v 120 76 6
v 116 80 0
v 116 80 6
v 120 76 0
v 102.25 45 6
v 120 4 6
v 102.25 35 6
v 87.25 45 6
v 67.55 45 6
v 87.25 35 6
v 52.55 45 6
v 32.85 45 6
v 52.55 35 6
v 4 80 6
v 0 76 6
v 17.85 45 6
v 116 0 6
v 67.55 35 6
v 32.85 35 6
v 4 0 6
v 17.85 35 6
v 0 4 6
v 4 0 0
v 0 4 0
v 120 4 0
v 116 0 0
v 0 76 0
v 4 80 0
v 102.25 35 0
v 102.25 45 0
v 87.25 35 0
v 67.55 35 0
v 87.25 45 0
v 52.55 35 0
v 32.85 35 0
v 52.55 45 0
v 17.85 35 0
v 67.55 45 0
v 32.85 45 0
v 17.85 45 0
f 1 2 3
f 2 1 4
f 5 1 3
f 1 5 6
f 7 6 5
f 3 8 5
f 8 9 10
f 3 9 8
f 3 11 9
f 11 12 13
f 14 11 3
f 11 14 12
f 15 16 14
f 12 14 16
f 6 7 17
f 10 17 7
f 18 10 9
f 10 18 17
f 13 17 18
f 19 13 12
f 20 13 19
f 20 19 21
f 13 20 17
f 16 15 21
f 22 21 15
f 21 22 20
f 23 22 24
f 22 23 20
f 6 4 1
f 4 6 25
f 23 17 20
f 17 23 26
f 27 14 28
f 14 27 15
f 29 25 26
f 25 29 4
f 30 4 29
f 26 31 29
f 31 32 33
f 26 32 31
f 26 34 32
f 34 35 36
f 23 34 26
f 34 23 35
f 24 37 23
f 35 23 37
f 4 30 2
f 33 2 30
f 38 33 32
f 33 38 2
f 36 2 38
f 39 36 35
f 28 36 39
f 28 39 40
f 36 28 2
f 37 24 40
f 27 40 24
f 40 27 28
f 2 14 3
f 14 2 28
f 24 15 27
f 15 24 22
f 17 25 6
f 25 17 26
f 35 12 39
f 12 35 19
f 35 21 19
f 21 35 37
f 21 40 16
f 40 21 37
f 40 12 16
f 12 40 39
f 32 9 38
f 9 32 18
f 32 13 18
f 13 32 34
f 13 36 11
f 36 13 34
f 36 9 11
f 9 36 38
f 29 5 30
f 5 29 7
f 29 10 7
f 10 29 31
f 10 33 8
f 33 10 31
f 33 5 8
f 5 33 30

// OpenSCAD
$fn = 32;

// ----------------------------------------------------------------------
// Windowed plate: 3 voids, 120 x 80 x 6 mm
// ----------------------------------------------------------------------

// --- parameters (mm) ---
plate_l = 120;            // plate length, X
plate_w = 80;             // plate width, Y
plate_t = 6;              // plate thickness, Z
edge_margin = 8;          // wall from the plate edge to any window
windows = 3;              // number of windows in the row
win_l = 15;               // window length
win_w = 10;               // window width
win_pitch = 34.7;         // window pitch along X
depth_1 = 6;              // depth of void 1 (full thickness = through)
depth_2 = 6;              // depth of void 2 (full thickness = through)
depth_3 = 6;              // depth of void 3 (full thickness = through)
corner_c = 4;             // corner chamfer of the plate

profile = [[4, 0], [116, 0], [120, 4], [120, 76], [116, 80], [4, 80], [0, 76], [0, 4]];  // primary outline, 8 points, counter clockwise
void_1 = [[17.85, 35], [32.85, 35], [32.85, 45], [17.85, 45]];  // window 1 of the row, 4 points
void_2 = [[52.55, 35], [67.55, 35], [67.55, 45], [52.55, 45]];  // window 2 of the row, 4 points
void_3 = [[87.25, 35], [102.25, 35], [102.25, 45], [87.25, 45]];  // window 3 of the row, 4 points

// --- the one profile operation ---
difference() {
  linear_extrude(height = plate_t) polygon(points = profile);
  translate([0, 0, -1])
    linear_extrude(height = plate_t + 2) polygon(points = void_1);
  translate([0, 0, -1])
    linear_extrude(height = plate_t + 2) polygon(points = void_2);
  translate([0, 0, -1])
    linear_extrude(height = plate_t + 2) polygon(points = void_3);
}
